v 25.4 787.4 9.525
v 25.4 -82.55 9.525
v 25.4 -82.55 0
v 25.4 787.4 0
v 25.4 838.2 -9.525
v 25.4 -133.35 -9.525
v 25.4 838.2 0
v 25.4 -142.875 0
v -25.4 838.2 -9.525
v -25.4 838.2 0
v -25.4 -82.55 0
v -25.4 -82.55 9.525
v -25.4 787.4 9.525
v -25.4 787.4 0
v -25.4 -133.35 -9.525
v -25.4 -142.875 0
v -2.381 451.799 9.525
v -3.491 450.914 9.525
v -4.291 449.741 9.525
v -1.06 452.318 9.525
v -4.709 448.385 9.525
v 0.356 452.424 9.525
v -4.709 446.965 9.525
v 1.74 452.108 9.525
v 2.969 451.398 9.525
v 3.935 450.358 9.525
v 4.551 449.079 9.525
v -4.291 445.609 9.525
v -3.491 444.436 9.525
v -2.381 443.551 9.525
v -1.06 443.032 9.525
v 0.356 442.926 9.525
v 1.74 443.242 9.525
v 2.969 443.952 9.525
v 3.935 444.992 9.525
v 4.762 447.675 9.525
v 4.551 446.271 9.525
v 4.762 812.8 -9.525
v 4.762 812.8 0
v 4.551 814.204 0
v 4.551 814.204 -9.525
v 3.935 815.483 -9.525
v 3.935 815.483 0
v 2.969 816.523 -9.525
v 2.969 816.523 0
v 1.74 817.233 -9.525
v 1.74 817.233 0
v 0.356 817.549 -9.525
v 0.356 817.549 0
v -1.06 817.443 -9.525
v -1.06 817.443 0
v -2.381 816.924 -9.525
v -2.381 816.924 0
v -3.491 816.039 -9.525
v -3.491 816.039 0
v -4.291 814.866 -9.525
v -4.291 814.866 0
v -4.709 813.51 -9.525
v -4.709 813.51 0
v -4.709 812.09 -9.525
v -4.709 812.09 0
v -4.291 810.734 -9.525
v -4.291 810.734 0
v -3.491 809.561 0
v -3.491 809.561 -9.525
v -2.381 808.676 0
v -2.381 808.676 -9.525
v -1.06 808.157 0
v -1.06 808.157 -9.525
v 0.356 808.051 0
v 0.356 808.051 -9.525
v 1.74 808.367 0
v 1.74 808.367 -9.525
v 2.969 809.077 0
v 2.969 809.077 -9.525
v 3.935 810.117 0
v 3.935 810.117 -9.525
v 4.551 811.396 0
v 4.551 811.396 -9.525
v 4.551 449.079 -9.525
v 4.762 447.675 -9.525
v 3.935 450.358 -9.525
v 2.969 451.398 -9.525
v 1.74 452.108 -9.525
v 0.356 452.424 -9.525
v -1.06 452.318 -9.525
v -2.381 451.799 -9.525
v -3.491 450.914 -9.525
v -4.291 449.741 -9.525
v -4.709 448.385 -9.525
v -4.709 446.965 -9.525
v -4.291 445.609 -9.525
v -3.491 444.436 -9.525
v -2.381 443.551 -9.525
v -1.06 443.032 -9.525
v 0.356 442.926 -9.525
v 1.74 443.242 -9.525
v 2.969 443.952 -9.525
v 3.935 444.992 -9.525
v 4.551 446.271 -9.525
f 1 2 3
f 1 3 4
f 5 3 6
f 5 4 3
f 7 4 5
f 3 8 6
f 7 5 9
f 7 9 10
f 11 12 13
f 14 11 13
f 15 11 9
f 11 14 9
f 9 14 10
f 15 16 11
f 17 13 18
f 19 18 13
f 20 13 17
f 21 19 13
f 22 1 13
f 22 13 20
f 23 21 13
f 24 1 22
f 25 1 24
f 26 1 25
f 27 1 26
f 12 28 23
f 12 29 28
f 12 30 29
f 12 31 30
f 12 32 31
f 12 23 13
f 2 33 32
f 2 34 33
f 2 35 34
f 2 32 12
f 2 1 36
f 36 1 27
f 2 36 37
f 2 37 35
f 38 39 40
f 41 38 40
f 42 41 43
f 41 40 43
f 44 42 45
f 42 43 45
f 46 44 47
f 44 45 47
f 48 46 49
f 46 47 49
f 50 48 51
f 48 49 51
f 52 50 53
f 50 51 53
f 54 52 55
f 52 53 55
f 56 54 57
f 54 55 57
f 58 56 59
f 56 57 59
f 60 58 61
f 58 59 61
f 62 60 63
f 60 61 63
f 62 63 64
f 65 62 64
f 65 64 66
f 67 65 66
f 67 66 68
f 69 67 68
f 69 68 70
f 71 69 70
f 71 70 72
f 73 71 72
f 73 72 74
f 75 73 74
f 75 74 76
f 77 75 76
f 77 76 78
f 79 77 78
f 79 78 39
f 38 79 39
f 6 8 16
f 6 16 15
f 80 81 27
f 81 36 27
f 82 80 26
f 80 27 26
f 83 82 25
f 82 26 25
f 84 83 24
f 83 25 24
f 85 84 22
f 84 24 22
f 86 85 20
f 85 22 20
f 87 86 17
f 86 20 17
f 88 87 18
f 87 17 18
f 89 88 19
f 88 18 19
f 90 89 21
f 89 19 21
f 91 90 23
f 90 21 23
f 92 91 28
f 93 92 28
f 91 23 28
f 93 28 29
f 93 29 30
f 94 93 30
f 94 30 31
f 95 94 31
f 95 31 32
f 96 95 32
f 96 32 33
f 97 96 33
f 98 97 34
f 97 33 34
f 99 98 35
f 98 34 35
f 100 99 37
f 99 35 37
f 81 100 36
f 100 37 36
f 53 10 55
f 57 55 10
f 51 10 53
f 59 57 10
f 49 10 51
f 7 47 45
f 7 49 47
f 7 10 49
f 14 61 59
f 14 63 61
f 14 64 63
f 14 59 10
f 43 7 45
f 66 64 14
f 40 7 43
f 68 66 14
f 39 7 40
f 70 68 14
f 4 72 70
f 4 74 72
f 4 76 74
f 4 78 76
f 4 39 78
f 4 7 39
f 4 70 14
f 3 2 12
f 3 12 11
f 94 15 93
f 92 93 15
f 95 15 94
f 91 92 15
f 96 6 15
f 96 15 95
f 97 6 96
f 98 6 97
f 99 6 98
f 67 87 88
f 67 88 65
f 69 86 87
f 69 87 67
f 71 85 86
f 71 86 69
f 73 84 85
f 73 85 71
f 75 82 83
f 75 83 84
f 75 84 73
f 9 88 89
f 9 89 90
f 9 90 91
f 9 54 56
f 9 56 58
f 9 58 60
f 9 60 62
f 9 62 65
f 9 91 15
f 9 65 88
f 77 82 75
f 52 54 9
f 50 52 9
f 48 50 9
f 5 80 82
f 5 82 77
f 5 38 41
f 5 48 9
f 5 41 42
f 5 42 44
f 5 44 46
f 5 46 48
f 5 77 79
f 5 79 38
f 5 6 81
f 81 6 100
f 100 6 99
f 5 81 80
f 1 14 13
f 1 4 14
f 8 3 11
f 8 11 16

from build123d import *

# Parameters (mm, degrees)
F1_DEPTH = 25.4
F2_R     = 4.7625
F3_DEPTH = 12.7


with BuildPart() as f1:
    # F0 (on Right) → F1 (new body, symmetric)
    with BuildSketch(Plane.YZ):
        Polygon((787.4, 9.525), (0, 9.525), (-82.55, 9.525), (-82.55, 0), (-142.875, 0), (-133.35, -9.525), (-33.290768, -9.525), (838.2, -9.525), (838.2, 0), (787.4, 0), align=None)
    extrude(amount=F1_DEPTH, both=True)

    # F2 (on Top) → F3 (cut, symmetric)
    with BuildSketch(Plane.XY):
        with Locations((0, 812.8)):
            Circle(F2_R)
        with Locations((0, 447.675)):
            Circle(F2_R)
    extrude(amount=F3_DEPTH, both=True, mode=Mode.SUBTRACT)


solid = f1.part
